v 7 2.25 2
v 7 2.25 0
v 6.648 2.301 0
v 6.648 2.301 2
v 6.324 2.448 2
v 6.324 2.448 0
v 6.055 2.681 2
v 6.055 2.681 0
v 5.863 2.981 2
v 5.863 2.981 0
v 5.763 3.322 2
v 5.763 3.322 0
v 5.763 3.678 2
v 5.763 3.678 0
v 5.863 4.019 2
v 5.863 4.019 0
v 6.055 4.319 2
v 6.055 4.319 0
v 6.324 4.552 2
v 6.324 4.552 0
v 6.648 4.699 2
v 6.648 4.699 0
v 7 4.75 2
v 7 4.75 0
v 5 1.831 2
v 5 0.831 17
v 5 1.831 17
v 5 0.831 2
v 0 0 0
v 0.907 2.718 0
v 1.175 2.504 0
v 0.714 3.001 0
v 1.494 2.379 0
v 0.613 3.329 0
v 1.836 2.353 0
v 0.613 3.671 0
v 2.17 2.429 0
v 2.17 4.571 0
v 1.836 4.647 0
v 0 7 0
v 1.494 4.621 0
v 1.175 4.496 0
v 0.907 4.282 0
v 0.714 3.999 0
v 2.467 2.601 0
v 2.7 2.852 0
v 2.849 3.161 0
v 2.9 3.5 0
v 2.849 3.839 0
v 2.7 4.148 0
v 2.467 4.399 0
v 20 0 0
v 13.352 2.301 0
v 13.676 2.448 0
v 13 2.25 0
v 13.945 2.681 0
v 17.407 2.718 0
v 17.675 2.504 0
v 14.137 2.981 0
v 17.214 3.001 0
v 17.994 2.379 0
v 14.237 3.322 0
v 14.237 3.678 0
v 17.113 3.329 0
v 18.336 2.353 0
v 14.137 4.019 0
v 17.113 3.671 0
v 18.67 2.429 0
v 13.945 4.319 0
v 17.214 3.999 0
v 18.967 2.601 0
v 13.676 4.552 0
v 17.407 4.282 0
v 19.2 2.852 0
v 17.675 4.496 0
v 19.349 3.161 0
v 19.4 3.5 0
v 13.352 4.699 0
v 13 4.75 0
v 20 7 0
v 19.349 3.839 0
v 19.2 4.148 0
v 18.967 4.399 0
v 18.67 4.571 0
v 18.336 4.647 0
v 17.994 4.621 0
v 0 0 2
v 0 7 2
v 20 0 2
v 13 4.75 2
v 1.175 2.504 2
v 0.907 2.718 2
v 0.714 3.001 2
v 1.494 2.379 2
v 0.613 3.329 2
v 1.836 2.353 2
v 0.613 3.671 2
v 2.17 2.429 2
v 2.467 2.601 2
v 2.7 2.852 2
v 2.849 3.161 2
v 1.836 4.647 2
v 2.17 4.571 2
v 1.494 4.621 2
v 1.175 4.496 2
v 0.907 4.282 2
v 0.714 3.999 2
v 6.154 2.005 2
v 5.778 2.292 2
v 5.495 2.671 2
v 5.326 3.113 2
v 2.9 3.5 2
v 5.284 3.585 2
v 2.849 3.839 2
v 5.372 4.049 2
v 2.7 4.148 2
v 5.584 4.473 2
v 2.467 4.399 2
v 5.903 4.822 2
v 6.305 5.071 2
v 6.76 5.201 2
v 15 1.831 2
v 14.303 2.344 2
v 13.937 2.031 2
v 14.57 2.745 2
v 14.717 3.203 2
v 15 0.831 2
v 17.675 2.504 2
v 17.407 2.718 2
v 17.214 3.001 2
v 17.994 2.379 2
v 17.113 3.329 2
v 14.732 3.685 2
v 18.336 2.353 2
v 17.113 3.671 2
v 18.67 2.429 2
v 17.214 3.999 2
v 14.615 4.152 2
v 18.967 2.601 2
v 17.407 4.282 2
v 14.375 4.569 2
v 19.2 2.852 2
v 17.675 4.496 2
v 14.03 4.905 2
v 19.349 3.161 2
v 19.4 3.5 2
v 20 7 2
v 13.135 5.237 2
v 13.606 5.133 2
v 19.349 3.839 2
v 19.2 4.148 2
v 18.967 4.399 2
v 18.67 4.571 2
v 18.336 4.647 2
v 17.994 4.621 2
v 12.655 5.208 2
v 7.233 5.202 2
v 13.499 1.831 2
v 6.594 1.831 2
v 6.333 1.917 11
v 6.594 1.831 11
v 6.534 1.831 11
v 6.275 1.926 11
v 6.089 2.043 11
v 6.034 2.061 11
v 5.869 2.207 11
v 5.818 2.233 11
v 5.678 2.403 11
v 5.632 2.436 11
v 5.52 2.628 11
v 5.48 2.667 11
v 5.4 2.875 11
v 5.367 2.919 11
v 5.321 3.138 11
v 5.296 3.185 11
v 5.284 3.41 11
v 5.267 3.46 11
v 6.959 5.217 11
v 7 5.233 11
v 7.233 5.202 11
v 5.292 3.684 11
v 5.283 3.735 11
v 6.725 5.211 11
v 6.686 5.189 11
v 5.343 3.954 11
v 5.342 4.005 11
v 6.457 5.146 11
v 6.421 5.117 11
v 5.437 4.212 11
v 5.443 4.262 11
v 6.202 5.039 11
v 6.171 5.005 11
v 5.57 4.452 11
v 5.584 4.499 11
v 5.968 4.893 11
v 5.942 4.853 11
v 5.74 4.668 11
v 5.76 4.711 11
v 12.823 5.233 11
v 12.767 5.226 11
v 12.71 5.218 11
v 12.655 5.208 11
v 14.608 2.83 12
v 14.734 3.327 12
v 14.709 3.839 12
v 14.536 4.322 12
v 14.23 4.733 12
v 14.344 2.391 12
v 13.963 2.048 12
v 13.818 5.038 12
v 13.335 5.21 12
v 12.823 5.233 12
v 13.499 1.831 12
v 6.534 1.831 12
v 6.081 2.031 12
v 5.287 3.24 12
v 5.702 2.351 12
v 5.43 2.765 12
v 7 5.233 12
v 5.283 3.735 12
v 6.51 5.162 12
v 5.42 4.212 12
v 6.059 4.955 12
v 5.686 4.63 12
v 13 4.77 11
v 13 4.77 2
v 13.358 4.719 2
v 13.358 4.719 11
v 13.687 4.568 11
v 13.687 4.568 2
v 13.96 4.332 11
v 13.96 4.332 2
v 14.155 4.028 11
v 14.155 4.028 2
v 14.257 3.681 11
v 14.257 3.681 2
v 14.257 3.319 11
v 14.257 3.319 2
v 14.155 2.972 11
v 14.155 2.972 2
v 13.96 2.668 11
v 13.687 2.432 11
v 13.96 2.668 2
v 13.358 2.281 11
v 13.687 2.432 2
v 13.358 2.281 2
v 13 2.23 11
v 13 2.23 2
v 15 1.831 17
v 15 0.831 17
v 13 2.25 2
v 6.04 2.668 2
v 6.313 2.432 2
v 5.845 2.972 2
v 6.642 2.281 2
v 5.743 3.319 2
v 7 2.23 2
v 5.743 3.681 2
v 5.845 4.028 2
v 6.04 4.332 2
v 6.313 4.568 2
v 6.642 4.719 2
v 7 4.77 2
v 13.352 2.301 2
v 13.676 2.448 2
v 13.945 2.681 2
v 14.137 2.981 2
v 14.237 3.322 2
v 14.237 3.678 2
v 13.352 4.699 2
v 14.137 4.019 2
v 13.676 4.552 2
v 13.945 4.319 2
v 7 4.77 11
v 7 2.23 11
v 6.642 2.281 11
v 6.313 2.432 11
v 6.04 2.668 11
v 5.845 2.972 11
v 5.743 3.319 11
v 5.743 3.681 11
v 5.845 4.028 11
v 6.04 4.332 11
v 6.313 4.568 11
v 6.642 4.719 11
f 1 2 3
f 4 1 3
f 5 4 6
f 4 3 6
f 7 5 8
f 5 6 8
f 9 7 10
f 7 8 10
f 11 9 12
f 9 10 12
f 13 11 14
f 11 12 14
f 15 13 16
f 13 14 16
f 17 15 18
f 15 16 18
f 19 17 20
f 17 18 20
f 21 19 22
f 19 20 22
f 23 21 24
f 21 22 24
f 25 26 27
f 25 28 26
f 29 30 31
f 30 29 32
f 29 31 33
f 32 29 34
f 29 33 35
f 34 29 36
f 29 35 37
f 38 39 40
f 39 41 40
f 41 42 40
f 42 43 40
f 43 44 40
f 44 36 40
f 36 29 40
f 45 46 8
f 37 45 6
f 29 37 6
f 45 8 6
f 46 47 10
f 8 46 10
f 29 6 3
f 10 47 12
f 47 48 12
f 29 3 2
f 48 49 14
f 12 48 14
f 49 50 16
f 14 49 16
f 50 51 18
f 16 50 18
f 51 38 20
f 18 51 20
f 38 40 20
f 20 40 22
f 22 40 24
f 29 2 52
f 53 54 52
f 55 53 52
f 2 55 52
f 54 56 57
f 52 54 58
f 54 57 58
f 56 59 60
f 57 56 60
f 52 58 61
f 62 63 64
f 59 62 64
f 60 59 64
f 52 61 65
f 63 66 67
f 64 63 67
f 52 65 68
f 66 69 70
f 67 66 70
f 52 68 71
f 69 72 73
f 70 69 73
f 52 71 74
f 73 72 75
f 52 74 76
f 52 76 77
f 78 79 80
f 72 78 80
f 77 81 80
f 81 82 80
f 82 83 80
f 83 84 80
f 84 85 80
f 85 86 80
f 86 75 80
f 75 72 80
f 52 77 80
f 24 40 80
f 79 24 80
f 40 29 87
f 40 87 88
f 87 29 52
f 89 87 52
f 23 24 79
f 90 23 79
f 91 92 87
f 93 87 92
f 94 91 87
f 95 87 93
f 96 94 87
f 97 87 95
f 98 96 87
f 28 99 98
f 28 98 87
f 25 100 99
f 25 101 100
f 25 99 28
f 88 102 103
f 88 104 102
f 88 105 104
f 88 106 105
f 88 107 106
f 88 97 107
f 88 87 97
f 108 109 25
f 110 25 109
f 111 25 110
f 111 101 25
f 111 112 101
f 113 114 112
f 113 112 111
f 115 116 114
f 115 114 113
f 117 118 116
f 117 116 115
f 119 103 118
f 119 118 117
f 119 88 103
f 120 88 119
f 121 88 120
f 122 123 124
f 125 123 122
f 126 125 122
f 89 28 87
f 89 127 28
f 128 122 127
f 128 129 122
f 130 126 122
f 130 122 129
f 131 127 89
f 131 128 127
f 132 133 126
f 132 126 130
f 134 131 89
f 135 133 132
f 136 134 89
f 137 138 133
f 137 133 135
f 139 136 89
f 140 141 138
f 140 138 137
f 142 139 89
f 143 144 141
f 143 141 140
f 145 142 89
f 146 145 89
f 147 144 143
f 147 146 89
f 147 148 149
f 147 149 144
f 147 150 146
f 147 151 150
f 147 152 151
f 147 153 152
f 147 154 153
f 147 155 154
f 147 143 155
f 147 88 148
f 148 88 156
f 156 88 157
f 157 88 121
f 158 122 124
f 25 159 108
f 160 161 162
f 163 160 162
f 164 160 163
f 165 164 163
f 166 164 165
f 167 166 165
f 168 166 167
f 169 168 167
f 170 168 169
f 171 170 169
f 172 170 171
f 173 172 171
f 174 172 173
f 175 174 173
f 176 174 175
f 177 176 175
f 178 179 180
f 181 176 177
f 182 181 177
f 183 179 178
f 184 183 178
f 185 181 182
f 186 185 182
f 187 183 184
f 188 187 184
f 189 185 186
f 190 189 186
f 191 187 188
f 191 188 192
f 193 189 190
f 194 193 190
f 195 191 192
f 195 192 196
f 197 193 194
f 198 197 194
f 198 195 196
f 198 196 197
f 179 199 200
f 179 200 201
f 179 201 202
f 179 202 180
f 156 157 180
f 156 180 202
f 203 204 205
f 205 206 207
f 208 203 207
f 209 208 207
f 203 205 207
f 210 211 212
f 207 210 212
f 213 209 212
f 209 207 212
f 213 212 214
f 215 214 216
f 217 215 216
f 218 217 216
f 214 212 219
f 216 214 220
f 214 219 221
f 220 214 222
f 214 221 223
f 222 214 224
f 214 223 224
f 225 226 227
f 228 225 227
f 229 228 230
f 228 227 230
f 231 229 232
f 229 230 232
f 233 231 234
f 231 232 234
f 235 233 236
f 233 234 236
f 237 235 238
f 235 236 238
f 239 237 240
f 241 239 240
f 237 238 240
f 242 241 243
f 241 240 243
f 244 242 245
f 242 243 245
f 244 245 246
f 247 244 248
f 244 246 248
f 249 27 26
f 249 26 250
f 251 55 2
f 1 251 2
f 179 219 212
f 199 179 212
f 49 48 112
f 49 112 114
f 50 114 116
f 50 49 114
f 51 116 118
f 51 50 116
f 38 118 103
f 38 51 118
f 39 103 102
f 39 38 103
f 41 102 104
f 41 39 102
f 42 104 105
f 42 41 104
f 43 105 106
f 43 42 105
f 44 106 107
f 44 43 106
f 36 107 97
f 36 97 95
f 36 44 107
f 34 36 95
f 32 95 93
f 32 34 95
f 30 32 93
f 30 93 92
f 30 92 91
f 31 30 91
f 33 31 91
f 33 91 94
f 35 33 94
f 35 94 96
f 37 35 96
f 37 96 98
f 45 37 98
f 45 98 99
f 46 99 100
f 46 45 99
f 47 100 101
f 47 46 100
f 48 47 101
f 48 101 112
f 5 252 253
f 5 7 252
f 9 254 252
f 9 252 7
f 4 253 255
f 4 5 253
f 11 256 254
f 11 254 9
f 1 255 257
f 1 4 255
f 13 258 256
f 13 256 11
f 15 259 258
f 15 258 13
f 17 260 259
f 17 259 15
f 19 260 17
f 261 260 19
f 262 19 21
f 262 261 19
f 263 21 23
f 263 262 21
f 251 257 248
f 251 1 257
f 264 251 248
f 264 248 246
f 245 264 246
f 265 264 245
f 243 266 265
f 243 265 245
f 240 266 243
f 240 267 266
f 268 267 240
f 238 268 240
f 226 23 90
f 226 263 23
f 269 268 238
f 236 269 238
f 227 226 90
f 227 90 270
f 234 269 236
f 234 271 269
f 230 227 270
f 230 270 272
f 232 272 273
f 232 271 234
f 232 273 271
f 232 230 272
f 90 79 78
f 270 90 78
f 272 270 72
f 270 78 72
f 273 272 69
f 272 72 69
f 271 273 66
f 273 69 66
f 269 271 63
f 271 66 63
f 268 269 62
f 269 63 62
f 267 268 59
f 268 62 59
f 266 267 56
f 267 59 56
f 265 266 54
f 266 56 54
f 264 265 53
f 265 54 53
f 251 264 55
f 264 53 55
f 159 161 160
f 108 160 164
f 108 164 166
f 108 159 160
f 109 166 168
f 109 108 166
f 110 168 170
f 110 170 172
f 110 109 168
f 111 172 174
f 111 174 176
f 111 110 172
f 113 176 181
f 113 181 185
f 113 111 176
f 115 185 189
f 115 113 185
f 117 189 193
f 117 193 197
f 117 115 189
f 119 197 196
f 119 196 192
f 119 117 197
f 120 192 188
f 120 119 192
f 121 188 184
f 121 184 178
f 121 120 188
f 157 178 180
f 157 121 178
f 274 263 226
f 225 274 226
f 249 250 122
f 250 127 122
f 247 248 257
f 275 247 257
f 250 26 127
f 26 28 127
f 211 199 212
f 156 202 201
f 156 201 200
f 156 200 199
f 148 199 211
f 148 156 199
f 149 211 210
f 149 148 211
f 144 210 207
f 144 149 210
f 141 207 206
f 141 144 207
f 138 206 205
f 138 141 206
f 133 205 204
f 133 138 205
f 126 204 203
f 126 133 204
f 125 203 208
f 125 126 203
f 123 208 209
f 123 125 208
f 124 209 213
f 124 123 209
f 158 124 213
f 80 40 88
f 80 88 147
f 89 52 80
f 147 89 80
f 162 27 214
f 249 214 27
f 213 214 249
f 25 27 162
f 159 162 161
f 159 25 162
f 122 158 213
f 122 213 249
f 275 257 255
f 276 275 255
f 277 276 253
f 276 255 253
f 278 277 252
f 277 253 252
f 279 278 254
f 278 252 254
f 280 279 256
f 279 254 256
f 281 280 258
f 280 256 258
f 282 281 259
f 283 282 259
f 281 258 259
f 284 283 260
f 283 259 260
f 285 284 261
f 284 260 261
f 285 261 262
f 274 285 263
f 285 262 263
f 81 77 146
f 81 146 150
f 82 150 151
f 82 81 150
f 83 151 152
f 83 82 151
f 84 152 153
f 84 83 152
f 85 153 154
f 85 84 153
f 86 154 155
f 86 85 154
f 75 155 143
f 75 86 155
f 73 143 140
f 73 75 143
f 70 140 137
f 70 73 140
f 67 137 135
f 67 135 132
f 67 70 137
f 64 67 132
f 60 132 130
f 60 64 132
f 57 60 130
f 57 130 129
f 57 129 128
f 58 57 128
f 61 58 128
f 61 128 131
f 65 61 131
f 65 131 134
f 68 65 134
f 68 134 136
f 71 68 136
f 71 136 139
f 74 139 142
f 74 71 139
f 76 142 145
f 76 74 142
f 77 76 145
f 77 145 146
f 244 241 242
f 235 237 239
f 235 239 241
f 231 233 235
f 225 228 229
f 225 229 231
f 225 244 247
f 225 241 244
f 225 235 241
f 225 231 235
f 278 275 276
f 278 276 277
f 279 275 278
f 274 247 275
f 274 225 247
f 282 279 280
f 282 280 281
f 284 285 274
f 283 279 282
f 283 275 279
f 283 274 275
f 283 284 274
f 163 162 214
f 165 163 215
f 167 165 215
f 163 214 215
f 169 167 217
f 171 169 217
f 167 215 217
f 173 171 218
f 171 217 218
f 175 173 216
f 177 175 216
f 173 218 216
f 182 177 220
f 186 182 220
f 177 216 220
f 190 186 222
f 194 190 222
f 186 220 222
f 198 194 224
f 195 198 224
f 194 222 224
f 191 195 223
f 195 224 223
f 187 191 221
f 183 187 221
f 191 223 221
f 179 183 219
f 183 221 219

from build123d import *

# Parameters (mm, degrees)
SKETCH1_W            = 20
SKETCH1_H            = 7
SKETCH1_R            = 1.15
BOSS_EXTRUDE1_DEPTH  = 2
BOSS_EXTRUDE11_DEPTH = 10
BOSS_EXTRUDE12_DEPTH = 1
SKETCH8_W            = 10
SKETCH8_H            = 1
BOSS_EXTRUDE13_DEPTH = 5


with BuildPart() as part:
    # Sketch1 → Boss-Extrude1 (new body)
    with BuildSketch(Plane.XY):
        with Locations((10, 3.5)):
            Rectangle(SKETCH1_W, SKETCH1_H)
        with Locations((1.75, 3.5)):
            Circle(SKETCH1_R, mode=Mode.SUBTRACT)
        with Locations((18.25, 3.5)):
            Circle(SKETCH1_R, mode=Mode.SUBTRACT)
        with BuildLine():
            Line((7, 4.75), (13, 4.75))
            ThreePointArc((13, 4.75), (14.25, 3.5), (13, 2.25))
            Line((13, 2.25), (7, 2.25))
            ThreePointArc((7, 2.25), (5.75, 3.5), (7, 4.75))
        make_face(mode=Mode.SUBTRACT)
    extrude(amount=BOSS_EXTRUDE1_DEPTH)

    # Sketch6 → Boss-Extrude11 (add)
    with BuildSketch(Plane.XY.offset(2)):
        with BuildLine():
            Line((7.233144363, 5.202021214), (12.654721, 5.20752793))
            ThreePointArc((12.654721, 5.20752793), (14.690102928, 3.922399472), (13.498649888, 1.830803334))
            Line((13.498649888, 1.830803334), (15, 1.830803334))
            Line((15, 1.830803334), (15, 0.830803334))
            Line((15, 0.830803334), (5, 0.830803334))
            Line((5, 0.830803334), (5, 1.830803334))
            Line((5, 1.830803334), (6.593779621, 1.830803334))
            ThreePointArc((6.593779621, 1.830803334), (5.312171121, 3.820103391), (7.233144363, 5.202021214))
        make_face()
        with BuildLine():
            Line((7, 4.77), (13, 4.77))
            ThreePointArc((13, 4.77), (14.27, 3.5), (13, 2.23))
            Line((13, 2.23), (7, 2.23))
            ThreePointArc((7, 2.23), (5.73, 3.5), (7, 4.77))
        make_face(mode=Mode.SUBTRACT)
    extrude(amount=BOSS_EXTRUDE11_DEPTH)

    # Sketch7 → Boss-Extrude12 (add)
    with BuildSketch(Plane.XY.offset(12)):
        with BuildLine():
            Line((7, 5.233060679), (13, 5.233060679))
            ThreePointArc((13, 5.233060679), (14.733060679, 3.5), (13, 1.766939321))
            Line((13, 1.766939321), (7, 1.766939321))
            ThreePointArc((7, 1.766939321), (5.266939321, 3.5), (7, 5.233060679))
        make_face()
    extrude(amount=-BOSS_EXTRUDE12_DEPTH)

    # Sketch8 → Boss-Extrude13 (add)
    with BuildSketch(Plane.XY.offset(12)):
        with Locations((10, 1.330803334)):
            Rectangle(SKETCH8_W, SKETCH8_H)
    extrude(amount=BOSS_EXTRUDE13_DEPTH)


solid = part.part
